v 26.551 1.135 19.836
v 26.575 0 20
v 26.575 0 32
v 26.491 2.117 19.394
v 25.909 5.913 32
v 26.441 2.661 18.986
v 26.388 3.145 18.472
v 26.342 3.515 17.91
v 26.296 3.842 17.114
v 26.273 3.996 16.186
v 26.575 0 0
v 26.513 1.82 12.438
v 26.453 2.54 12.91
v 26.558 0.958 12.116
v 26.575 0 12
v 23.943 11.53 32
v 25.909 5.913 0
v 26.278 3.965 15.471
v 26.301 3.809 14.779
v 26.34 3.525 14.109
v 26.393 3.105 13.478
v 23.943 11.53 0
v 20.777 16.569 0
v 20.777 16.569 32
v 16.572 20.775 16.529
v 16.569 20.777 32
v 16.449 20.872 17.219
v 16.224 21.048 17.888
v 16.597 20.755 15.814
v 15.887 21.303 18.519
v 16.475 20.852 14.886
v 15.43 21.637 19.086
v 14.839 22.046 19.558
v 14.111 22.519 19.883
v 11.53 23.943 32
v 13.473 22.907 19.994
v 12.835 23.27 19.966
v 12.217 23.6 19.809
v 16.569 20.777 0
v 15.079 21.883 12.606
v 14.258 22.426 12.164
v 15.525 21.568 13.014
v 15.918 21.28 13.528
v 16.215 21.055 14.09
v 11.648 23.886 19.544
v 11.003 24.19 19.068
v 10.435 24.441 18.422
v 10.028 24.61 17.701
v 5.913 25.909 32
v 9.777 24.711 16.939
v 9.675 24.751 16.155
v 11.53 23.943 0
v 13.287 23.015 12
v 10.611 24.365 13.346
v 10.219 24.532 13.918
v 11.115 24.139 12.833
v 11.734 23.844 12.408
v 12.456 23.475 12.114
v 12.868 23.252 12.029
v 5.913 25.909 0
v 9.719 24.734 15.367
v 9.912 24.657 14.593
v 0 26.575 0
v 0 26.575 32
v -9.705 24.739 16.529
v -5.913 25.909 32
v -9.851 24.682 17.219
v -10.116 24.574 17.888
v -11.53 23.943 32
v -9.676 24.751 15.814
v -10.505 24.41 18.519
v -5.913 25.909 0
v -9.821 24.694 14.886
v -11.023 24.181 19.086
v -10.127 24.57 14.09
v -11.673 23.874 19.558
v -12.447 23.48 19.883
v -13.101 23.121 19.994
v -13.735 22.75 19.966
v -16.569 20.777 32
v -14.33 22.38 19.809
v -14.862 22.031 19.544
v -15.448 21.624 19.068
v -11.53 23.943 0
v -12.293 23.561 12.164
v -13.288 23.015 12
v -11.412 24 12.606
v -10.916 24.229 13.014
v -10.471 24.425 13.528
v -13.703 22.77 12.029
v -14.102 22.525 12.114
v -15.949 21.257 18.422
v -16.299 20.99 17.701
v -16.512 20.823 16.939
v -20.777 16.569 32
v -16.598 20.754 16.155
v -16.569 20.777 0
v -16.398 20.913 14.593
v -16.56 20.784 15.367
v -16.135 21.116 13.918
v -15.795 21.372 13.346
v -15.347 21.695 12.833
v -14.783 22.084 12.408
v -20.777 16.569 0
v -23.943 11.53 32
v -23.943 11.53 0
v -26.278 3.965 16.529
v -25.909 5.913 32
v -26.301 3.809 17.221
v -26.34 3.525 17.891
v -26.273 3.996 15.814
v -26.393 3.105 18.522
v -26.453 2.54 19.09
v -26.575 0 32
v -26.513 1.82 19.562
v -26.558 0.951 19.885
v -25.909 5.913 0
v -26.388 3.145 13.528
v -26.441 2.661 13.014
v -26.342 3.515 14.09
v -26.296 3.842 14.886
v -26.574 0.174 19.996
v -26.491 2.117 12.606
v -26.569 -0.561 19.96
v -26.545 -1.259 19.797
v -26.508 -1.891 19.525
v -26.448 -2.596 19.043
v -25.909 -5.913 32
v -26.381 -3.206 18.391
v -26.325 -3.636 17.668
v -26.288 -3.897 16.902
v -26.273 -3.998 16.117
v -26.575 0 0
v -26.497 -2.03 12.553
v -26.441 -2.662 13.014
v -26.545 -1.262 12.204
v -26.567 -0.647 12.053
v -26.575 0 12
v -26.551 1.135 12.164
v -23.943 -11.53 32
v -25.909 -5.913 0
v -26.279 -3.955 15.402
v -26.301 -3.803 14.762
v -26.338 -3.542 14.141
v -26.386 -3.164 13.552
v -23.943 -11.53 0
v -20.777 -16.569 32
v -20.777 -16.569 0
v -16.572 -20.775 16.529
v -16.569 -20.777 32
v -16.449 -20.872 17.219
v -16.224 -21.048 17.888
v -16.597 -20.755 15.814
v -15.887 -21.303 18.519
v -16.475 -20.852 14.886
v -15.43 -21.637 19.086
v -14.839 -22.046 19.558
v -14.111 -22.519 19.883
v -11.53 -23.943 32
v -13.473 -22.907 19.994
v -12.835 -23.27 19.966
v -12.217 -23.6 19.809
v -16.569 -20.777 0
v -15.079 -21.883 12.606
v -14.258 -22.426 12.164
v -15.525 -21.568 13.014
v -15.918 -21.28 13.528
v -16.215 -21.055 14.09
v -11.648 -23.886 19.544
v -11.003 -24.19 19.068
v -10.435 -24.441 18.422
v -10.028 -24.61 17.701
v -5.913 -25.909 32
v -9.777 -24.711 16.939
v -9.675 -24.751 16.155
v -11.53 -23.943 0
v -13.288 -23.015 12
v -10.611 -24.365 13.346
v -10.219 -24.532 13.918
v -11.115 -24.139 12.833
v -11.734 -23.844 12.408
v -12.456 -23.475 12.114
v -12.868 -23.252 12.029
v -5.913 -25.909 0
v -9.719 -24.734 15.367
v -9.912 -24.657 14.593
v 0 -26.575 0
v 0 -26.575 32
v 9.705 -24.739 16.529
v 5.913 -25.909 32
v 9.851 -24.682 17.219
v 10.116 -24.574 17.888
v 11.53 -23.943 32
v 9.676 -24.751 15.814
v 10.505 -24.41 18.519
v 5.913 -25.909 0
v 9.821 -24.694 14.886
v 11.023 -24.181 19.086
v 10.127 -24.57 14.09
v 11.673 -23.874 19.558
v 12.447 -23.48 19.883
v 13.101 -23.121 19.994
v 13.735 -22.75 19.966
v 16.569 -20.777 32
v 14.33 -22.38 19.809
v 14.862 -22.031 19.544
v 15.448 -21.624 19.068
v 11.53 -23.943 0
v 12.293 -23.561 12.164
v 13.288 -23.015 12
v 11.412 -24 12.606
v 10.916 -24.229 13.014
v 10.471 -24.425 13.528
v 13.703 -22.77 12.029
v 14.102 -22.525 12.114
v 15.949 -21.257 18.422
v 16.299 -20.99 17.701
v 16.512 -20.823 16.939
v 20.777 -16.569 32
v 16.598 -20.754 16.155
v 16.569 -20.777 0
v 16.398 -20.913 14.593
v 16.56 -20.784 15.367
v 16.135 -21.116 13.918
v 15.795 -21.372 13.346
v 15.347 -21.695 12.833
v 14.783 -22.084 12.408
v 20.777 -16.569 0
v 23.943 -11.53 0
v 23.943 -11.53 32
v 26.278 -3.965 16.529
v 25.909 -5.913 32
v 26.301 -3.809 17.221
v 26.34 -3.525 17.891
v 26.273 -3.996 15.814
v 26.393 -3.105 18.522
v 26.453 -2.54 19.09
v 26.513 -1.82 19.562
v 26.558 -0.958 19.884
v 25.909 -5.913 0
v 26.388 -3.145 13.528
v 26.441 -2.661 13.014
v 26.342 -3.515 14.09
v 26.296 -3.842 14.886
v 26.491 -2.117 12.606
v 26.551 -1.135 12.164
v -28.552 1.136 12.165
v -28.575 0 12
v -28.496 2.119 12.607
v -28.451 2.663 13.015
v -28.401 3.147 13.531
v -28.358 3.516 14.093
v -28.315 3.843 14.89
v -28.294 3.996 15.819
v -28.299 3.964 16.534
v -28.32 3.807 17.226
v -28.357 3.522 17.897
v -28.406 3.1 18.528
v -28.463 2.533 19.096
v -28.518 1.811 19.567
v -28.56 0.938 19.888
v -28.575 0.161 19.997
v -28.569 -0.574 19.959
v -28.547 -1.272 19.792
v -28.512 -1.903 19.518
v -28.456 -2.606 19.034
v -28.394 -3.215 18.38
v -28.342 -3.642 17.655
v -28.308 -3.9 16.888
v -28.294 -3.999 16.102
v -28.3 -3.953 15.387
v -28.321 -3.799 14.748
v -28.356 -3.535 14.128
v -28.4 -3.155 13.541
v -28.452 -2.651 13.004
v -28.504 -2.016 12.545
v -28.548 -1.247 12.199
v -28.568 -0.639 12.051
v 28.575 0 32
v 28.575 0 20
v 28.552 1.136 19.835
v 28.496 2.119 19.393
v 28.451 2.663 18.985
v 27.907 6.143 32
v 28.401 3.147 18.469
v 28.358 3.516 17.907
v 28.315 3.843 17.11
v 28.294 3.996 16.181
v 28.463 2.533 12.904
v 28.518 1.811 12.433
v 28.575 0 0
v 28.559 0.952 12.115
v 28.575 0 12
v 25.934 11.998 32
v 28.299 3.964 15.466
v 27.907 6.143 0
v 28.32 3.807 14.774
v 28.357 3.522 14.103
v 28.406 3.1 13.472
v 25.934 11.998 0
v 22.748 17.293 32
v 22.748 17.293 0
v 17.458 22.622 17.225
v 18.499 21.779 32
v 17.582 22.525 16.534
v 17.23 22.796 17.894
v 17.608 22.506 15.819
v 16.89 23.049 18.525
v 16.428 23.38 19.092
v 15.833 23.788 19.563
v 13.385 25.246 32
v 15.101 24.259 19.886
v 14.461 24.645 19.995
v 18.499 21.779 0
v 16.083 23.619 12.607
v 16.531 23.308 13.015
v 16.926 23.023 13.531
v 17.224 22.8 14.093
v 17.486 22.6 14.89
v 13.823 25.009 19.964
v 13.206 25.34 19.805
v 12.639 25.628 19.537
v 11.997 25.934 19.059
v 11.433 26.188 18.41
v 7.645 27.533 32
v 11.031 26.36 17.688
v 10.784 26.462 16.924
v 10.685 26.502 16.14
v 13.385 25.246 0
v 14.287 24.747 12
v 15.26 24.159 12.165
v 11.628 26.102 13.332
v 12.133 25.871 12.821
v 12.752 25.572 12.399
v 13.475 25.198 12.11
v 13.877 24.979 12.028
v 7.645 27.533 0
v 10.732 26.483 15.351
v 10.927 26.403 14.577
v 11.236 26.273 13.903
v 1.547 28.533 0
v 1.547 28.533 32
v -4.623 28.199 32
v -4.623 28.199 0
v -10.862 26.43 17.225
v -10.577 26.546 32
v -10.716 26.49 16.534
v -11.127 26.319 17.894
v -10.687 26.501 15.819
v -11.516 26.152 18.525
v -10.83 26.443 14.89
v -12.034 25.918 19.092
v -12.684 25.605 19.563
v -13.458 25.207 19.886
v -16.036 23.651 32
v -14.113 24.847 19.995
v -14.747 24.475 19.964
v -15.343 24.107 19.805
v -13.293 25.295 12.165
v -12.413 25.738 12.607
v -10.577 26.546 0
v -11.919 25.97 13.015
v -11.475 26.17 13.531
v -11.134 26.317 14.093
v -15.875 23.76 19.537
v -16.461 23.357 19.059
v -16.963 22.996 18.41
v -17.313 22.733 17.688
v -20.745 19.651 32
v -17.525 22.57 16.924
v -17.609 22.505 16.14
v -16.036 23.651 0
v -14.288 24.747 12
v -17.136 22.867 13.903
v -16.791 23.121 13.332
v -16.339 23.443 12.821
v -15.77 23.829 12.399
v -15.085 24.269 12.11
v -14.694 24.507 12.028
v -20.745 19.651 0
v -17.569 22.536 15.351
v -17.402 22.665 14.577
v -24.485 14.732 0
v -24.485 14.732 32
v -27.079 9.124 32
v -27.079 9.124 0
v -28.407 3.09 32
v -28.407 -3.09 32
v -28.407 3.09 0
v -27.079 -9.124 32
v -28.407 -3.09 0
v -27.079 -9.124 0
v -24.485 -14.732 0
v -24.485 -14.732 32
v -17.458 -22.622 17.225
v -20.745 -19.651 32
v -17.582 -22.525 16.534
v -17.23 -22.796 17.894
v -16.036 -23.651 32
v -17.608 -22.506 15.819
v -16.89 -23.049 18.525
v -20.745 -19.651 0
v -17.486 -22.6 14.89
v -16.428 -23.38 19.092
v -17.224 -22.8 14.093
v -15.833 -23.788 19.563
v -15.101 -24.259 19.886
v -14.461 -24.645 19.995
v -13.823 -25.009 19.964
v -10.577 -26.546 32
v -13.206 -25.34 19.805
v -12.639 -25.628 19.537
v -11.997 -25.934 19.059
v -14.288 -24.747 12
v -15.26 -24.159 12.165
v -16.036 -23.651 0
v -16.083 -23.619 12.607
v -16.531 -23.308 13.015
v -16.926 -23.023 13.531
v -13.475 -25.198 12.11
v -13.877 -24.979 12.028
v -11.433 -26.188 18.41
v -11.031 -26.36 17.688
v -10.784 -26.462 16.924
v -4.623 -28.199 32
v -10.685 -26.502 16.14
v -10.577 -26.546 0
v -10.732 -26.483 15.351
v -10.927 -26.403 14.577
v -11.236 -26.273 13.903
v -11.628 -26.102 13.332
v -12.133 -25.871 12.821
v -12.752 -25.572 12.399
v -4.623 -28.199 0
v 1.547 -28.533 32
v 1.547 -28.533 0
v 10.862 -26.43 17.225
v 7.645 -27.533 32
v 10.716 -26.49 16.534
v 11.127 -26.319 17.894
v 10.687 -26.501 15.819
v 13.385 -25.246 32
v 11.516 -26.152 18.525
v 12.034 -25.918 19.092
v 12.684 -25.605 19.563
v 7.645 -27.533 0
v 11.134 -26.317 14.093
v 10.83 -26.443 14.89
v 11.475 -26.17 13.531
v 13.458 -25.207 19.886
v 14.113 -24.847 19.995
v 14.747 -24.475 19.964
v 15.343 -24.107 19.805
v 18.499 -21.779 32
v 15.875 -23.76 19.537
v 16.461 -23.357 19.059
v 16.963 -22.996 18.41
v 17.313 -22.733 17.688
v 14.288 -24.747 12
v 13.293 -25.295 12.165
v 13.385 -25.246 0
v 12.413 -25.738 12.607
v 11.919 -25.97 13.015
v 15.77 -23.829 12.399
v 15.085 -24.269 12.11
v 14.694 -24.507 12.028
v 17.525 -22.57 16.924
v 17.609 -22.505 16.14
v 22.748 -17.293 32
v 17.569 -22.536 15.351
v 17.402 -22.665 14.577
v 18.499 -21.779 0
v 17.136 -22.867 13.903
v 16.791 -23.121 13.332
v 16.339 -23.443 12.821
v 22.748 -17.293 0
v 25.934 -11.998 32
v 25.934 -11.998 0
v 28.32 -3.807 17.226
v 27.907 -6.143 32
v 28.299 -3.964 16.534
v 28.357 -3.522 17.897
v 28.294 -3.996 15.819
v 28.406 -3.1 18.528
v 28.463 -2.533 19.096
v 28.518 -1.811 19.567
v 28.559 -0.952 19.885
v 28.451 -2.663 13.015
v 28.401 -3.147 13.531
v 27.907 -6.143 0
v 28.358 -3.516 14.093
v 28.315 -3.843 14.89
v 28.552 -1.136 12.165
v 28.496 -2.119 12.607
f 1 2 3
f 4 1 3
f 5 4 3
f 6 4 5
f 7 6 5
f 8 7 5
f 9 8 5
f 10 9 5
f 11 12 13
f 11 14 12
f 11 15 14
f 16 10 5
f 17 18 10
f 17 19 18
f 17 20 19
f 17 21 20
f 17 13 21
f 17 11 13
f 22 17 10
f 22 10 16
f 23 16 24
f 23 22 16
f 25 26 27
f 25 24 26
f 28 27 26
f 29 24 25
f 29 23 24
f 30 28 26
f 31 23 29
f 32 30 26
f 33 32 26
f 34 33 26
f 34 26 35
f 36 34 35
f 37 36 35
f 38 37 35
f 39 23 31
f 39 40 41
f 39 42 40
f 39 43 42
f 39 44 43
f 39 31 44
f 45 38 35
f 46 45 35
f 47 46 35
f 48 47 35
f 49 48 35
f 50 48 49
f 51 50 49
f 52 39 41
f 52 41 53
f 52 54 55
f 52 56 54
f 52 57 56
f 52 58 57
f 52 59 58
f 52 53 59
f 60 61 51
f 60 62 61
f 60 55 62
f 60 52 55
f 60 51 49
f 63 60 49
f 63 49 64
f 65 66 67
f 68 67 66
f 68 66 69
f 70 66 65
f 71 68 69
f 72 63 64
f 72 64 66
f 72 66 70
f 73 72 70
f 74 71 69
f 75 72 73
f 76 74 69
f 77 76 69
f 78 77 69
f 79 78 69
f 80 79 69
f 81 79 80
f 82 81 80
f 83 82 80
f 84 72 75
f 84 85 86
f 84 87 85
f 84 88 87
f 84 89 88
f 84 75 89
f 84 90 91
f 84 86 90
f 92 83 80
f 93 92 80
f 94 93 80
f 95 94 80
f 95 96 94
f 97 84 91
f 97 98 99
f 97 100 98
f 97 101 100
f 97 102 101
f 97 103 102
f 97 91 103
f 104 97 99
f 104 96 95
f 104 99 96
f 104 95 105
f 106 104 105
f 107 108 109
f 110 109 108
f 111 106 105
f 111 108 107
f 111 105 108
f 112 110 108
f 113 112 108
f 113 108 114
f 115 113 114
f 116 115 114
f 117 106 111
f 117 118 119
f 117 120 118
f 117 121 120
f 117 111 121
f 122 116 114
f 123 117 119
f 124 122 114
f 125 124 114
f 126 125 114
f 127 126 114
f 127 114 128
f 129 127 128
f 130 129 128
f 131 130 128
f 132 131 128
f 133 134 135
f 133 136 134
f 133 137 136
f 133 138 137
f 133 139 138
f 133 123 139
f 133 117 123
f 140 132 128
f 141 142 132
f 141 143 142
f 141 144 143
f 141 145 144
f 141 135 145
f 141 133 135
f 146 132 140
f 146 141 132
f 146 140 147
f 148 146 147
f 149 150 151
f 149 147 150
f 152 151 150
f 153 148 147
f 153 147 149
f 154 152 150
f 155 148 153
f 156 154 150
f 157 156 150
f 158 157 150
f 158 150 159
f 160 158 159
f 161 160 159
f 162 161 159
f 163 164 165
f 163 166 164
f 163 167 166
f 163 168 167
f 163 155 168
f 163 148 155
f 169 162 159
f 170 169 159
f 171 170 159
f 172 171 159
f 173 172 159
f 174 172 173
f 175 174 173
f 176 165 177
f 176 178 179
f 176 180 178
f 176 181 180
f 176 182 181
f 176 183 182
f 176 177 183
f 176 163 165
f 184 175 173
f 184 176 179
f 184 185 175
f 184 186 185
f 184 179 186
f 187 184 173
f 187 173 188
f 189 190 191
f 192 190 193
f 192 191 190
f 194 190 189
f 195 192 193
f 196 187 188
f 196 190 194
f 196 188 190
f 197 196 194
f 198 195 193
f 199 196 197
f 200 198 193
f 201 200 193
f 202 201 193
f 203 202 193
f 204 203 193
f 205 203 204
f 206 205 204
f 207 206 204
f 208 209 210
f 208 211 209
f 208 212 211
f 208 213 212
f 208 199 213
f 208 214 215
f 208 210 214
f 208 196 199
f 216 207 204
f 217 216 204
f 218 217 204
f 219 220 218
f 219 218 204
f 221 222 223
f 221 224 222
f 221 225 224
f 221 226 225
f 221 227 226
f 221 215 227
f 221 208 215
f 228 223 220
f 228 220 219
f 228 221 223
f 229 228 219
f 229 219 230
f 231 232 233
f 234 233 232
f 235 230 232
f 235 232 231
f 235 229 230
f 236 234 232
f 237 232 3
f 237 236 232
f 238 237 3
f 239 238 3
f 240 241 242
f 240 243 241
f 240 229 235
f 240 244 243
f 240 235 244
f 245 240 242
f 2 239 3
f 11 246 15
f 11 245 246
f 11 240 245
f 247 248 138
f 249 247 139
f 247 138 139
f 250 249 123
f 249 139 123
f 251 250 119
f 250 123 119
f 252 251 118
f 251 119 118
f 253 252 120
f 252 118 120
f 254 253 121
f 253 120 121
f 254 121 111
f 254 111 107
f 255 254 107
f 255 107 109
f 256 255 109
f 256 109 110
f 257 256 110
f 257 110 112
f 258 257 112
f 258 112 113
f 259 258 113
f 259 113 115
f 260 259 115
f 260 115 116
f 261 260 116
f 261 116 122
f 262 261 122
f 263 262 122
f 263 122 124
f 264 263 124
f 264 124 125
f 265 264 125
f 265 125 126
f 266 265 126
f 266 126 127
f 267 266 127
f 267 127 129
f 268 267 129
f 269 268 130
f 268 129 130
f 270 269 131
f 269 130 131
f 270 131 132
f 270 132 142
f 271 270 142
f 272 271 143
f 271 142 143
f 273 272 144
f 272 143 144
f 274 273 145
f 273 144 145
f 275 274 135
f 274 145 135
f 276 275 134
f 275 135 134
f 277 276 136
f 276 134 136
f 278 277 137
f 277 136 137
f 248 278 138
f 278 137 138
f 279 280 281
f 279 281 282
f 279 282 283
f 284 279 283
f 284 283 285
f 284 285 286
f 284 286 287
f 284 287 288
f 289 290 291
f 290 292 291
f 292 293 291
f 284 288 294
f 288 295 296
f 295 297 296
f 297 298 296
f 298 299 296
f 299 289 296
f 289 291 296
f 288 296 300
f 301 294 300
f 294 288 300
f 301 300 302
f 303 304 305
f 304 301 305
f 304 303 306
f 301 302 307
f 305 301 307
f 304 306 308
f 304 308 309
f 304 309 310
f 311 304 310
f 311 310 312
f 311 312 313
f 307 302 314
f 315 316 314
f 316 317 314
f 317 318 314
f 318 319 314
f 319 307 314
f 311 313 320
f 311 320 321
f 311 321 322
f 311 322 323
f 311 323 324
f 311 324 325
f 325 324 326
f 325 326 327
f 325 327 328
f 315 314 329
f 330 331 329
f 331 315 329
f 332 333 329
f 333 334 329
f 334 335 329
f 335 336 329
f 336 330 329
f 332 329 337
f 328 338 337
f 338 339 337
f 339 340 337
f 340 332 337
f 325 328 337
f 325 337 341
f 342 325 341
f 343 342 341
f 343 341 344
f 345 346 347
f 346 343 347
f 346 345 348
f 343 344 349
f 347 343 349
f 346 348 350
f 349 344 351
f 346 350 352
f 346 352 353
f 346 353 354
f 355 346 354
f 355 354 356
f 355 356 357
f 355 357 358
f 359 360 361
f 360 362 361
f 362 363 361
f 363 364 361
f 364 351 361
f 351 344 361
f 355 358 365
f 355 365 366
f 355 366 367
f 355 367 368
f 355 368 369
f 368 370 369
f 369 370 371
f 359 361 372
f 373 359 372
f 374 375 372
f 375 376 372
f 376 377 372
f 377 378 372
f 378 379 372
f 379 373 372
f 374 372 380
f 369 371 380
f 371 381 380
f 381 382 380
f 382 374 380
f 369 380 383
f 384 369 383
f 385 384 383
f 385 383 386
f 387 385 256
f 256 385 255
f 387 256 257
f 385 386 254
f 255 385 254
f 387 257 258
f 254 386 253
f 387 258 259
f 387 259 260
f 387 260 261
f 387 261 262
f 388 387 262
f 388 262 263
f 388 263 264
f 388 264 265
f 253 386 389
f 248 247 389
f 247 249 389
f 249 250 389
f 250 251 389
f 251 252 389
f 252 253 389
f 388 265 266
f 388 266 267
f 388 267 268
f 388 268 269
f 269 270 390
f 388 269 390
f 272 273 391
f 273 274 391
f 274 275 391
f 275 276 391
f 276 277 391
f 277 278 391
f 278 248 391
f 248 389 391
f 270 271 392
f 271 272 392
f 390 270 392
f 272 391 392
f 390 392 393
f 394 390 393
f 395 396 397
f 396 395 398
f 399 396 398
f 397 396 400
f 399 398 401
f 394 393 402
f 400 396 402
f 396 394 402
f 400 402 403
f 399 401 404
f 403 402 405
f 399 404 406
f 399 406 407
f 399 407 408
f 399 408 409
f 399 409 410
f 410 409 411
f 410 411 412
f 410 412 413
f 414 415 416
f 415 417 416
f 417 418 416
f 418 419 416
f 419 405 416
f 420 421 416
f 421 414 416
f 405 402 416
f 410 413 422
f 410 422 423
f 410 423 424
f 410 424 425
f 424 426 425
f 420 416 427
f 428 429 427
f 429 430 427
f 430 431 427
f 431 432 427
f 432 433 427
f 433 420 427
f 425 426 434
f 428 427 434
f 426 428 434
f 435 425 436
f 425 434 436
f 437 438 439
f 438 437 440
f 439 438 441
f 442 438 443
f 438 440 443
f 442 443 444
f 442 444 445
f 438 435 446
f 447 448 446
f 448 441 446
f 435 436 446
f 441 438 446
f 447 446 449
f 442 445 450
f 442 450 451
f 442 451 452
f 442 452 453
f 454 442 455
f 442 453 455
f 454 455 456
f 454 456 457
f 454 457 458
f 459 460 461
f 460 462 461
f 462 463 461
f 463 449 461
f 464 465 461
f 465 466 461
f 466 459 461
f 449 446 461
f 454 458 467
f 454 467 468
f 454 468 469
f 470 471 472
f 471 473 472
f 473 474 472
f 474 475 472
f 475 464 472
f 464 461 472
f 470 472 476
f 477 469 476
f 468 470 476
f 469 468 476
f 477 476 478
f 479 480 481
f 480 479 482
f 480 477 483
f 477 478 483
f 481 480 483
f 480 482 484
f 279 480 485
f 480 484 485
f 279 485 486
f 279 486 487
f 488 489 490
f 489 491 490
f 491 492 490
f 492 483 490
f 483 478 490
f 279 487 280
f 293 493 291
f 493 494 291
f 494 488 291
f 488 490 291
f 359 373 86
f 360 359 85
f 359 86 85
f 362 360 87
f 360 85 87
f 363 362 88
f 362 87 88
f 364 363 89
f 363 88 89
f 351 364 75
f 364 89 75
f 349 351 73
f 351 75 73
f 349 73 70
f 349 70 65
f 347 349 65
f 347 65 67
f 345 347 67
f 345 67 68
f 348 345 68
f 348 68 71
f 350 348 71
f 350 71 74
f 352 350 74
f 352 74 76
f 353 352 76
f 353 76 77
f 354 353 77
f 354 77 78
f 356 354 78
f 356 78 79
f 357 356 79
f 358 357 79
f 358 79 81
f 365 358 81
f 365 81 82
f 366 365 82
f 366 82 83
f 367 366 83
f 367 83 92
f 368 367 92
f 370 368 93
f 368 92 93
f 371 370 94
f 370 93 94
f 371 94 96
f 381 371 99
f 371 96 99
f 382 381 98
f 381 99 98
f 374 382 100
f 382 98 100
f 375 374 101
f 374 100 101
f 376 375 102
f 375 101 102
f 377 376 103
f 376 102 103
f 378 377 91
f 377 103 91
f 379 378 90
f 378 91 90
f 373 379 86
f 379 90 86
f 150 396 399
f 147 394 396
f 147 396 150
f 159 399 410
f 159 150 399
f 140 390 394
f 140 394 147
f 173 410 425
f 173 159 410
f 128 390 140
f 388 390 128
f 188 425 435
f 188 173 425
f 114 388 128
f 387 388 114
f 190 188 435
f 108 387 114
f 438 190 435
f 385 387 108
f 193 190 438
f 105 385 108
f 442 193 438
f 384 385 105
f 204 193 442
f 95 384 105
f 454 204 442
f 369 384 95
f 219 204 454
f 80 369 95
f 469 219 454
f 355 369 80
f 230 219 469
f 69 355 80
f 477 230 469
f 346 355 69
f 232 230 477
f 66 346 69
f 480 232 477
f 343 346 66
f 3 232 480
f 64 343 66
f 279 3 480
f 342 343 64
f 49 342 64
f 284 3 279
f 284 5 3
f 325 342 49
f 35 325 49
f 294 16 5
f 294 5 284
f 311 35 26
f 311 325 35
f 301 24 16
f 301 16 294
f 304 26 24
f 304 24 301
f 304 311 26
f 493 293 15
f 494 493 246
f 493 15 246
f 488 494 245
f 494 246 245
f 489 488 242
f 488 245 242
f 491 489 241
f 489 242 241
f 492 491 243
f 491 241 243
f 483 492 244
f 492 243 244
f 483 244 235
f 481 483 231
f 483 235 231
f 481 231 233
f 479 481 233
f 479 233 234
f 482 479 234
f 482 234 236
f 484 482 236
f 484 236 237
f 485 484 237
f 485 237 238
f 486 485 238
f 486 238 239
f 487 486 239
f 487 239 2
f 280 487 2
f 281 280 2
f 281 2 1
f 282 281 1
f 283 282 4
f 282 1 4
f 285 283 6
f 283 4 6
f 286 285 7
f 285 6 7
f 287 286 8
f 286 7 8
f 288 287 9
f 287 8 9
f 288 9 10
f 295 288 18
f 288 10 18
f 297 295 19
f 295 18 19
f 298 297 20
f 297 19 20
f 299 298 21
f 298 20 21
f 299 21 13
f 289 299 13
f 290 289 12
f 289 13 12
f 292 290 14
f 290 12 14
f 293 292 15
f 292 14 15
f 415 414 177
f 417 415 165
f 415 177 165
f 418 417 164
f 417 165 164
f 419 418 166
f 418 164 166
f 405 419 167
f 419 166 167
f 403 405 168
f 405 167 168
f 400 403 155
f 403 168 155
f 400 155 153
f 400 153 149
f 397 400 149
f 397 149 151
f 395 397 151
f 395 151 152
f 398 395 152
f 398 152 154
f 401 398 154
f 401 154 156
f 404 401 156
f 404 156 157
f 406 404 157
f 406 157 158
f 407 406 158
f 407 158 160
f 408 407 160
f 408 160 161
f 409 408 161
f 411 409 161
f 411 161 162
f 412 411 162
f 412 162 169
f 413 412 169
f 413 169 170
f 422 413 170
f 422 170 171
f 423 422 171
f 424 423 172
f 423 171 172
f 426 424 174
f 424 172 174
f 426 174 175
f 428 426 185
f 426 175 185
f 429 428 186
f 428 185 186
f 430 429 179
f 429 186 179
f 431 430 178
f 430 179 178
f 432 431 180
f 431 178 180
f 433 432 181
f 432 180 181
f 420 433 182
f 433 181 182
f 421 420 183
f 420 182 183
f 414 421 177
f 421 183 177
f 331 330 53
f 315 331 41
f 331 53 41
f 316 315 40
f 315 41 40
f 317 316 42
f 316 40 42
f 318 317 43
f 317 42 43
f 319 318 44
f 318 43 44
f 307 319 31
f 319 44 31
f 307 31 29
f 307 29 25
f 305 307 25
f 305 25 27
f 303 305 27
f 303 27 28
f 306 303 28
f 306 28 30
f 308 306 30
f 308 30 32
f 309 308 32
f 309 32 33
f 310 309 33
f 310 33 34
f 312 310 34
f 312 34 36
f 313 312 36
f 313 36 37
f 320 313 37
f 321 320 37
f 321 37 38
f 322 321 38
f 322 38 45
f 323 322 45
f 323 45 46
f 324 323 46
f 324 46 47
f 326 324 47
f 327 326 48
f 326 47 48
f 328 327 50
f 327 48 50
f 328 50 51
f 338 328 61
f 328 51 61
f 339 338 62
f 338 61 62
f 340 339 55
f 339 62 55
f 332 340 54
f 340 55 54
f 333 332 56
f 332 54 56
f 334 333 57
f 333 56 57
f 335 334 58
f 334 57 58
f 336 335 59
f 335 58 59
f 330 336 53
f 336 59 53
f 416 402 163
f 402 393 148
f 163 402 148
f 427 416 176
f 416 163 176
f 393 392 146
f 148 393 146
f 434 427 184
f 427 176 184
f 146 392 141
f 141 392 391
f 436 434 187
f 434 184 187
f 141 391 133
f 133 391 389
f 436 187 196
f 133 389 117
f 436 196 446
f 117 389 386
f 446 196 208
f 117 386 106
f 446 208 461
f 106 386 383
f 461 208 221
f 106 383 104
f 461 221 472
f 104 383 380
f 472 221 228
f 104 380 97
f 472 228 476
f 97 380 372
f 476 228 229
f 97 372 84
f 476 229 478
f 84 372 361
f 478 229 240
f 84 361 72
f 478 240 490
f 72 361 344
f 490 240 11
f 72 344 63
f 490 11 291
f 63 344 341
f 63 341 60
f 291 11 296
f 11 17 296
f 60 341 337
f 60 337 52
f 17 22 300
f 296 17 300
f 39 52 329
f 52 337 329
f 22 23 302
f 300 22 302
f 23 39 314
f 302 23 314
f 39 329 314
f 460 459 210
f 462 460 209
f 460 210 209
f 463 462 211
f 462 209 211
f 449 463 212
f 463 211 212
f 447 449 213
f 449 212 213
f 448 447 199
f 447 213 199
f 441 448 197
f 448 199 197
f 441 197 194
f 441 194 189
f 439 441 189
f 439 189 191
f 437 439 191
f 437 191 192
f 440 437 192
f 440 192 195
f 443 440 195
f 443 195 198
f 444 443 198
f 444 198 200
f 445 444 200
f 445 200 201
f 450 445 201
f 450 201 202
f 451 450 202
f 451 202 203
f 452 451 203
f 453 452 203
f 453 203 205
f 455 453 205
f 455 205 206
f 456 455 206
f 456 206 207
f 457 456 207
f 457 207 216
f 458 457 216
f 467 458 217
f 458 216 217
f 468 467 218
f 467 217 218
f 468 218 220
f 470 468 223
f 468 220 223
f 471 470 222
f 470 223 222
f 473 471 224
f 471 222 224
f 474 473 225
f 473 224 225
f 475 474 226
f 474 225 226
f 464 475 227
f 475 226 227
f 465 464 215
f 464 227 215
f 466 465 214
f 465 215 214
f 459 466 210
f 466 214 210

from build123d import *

# Parameters (mm, degrees)
ESBO_O1_R                = 28.575
ESBO_O1_R_2              = 26.575
RESSALTO_EXTRUS_O1_DEPTH = 32
ESBO_O2_R                = 4
CORTE_EXTRUS_O1_DEPTH    = 32
PADR_OCIRCULAR1_COUNT    = 6


with BuildPart() as part:
    # Esboço1 → Ressalto-extrusão1 (new body)
    with BuildSketch(Plane.XY):
        Circle(ESBO_O1_R)
        Circle(ESBO_O1_R_2, mode=Mode.SUBTRACT)
    extrude(amount=RESSALTO_EXTRUS_O1_DEPTH)

    # Esboço2 → Corte-extrusão1 (cut)
    with BuildSketch(Plane(origin=(0, 0, 0), x_dir=(0, 0, -1), z_dir=(1, 0, 0))):
        with Locations((-16, 0)):
            Circle(ESBO_O2_R)
    corte_extrus_o1 = extrude(amount=-CORTE_EXTRUS_O1_DEPTH, mode=Mode.SUBTRACT)

    # PadrãoCircular1: Corte-extrusão1 ×6 about axis
    padr_ocircular1_axis = Axis((0, 0, 32), (0, 0, -1))
    for i in range(1, PADR_OCIRCULAR1_COUNT):
        add(corte_extrus_o1.rotate(padr_ocircular1_axis, i * 360 / PADR_OCIRCULAR1_COUNT), mode=Mode.SUBTRACT)


solid = part.part
